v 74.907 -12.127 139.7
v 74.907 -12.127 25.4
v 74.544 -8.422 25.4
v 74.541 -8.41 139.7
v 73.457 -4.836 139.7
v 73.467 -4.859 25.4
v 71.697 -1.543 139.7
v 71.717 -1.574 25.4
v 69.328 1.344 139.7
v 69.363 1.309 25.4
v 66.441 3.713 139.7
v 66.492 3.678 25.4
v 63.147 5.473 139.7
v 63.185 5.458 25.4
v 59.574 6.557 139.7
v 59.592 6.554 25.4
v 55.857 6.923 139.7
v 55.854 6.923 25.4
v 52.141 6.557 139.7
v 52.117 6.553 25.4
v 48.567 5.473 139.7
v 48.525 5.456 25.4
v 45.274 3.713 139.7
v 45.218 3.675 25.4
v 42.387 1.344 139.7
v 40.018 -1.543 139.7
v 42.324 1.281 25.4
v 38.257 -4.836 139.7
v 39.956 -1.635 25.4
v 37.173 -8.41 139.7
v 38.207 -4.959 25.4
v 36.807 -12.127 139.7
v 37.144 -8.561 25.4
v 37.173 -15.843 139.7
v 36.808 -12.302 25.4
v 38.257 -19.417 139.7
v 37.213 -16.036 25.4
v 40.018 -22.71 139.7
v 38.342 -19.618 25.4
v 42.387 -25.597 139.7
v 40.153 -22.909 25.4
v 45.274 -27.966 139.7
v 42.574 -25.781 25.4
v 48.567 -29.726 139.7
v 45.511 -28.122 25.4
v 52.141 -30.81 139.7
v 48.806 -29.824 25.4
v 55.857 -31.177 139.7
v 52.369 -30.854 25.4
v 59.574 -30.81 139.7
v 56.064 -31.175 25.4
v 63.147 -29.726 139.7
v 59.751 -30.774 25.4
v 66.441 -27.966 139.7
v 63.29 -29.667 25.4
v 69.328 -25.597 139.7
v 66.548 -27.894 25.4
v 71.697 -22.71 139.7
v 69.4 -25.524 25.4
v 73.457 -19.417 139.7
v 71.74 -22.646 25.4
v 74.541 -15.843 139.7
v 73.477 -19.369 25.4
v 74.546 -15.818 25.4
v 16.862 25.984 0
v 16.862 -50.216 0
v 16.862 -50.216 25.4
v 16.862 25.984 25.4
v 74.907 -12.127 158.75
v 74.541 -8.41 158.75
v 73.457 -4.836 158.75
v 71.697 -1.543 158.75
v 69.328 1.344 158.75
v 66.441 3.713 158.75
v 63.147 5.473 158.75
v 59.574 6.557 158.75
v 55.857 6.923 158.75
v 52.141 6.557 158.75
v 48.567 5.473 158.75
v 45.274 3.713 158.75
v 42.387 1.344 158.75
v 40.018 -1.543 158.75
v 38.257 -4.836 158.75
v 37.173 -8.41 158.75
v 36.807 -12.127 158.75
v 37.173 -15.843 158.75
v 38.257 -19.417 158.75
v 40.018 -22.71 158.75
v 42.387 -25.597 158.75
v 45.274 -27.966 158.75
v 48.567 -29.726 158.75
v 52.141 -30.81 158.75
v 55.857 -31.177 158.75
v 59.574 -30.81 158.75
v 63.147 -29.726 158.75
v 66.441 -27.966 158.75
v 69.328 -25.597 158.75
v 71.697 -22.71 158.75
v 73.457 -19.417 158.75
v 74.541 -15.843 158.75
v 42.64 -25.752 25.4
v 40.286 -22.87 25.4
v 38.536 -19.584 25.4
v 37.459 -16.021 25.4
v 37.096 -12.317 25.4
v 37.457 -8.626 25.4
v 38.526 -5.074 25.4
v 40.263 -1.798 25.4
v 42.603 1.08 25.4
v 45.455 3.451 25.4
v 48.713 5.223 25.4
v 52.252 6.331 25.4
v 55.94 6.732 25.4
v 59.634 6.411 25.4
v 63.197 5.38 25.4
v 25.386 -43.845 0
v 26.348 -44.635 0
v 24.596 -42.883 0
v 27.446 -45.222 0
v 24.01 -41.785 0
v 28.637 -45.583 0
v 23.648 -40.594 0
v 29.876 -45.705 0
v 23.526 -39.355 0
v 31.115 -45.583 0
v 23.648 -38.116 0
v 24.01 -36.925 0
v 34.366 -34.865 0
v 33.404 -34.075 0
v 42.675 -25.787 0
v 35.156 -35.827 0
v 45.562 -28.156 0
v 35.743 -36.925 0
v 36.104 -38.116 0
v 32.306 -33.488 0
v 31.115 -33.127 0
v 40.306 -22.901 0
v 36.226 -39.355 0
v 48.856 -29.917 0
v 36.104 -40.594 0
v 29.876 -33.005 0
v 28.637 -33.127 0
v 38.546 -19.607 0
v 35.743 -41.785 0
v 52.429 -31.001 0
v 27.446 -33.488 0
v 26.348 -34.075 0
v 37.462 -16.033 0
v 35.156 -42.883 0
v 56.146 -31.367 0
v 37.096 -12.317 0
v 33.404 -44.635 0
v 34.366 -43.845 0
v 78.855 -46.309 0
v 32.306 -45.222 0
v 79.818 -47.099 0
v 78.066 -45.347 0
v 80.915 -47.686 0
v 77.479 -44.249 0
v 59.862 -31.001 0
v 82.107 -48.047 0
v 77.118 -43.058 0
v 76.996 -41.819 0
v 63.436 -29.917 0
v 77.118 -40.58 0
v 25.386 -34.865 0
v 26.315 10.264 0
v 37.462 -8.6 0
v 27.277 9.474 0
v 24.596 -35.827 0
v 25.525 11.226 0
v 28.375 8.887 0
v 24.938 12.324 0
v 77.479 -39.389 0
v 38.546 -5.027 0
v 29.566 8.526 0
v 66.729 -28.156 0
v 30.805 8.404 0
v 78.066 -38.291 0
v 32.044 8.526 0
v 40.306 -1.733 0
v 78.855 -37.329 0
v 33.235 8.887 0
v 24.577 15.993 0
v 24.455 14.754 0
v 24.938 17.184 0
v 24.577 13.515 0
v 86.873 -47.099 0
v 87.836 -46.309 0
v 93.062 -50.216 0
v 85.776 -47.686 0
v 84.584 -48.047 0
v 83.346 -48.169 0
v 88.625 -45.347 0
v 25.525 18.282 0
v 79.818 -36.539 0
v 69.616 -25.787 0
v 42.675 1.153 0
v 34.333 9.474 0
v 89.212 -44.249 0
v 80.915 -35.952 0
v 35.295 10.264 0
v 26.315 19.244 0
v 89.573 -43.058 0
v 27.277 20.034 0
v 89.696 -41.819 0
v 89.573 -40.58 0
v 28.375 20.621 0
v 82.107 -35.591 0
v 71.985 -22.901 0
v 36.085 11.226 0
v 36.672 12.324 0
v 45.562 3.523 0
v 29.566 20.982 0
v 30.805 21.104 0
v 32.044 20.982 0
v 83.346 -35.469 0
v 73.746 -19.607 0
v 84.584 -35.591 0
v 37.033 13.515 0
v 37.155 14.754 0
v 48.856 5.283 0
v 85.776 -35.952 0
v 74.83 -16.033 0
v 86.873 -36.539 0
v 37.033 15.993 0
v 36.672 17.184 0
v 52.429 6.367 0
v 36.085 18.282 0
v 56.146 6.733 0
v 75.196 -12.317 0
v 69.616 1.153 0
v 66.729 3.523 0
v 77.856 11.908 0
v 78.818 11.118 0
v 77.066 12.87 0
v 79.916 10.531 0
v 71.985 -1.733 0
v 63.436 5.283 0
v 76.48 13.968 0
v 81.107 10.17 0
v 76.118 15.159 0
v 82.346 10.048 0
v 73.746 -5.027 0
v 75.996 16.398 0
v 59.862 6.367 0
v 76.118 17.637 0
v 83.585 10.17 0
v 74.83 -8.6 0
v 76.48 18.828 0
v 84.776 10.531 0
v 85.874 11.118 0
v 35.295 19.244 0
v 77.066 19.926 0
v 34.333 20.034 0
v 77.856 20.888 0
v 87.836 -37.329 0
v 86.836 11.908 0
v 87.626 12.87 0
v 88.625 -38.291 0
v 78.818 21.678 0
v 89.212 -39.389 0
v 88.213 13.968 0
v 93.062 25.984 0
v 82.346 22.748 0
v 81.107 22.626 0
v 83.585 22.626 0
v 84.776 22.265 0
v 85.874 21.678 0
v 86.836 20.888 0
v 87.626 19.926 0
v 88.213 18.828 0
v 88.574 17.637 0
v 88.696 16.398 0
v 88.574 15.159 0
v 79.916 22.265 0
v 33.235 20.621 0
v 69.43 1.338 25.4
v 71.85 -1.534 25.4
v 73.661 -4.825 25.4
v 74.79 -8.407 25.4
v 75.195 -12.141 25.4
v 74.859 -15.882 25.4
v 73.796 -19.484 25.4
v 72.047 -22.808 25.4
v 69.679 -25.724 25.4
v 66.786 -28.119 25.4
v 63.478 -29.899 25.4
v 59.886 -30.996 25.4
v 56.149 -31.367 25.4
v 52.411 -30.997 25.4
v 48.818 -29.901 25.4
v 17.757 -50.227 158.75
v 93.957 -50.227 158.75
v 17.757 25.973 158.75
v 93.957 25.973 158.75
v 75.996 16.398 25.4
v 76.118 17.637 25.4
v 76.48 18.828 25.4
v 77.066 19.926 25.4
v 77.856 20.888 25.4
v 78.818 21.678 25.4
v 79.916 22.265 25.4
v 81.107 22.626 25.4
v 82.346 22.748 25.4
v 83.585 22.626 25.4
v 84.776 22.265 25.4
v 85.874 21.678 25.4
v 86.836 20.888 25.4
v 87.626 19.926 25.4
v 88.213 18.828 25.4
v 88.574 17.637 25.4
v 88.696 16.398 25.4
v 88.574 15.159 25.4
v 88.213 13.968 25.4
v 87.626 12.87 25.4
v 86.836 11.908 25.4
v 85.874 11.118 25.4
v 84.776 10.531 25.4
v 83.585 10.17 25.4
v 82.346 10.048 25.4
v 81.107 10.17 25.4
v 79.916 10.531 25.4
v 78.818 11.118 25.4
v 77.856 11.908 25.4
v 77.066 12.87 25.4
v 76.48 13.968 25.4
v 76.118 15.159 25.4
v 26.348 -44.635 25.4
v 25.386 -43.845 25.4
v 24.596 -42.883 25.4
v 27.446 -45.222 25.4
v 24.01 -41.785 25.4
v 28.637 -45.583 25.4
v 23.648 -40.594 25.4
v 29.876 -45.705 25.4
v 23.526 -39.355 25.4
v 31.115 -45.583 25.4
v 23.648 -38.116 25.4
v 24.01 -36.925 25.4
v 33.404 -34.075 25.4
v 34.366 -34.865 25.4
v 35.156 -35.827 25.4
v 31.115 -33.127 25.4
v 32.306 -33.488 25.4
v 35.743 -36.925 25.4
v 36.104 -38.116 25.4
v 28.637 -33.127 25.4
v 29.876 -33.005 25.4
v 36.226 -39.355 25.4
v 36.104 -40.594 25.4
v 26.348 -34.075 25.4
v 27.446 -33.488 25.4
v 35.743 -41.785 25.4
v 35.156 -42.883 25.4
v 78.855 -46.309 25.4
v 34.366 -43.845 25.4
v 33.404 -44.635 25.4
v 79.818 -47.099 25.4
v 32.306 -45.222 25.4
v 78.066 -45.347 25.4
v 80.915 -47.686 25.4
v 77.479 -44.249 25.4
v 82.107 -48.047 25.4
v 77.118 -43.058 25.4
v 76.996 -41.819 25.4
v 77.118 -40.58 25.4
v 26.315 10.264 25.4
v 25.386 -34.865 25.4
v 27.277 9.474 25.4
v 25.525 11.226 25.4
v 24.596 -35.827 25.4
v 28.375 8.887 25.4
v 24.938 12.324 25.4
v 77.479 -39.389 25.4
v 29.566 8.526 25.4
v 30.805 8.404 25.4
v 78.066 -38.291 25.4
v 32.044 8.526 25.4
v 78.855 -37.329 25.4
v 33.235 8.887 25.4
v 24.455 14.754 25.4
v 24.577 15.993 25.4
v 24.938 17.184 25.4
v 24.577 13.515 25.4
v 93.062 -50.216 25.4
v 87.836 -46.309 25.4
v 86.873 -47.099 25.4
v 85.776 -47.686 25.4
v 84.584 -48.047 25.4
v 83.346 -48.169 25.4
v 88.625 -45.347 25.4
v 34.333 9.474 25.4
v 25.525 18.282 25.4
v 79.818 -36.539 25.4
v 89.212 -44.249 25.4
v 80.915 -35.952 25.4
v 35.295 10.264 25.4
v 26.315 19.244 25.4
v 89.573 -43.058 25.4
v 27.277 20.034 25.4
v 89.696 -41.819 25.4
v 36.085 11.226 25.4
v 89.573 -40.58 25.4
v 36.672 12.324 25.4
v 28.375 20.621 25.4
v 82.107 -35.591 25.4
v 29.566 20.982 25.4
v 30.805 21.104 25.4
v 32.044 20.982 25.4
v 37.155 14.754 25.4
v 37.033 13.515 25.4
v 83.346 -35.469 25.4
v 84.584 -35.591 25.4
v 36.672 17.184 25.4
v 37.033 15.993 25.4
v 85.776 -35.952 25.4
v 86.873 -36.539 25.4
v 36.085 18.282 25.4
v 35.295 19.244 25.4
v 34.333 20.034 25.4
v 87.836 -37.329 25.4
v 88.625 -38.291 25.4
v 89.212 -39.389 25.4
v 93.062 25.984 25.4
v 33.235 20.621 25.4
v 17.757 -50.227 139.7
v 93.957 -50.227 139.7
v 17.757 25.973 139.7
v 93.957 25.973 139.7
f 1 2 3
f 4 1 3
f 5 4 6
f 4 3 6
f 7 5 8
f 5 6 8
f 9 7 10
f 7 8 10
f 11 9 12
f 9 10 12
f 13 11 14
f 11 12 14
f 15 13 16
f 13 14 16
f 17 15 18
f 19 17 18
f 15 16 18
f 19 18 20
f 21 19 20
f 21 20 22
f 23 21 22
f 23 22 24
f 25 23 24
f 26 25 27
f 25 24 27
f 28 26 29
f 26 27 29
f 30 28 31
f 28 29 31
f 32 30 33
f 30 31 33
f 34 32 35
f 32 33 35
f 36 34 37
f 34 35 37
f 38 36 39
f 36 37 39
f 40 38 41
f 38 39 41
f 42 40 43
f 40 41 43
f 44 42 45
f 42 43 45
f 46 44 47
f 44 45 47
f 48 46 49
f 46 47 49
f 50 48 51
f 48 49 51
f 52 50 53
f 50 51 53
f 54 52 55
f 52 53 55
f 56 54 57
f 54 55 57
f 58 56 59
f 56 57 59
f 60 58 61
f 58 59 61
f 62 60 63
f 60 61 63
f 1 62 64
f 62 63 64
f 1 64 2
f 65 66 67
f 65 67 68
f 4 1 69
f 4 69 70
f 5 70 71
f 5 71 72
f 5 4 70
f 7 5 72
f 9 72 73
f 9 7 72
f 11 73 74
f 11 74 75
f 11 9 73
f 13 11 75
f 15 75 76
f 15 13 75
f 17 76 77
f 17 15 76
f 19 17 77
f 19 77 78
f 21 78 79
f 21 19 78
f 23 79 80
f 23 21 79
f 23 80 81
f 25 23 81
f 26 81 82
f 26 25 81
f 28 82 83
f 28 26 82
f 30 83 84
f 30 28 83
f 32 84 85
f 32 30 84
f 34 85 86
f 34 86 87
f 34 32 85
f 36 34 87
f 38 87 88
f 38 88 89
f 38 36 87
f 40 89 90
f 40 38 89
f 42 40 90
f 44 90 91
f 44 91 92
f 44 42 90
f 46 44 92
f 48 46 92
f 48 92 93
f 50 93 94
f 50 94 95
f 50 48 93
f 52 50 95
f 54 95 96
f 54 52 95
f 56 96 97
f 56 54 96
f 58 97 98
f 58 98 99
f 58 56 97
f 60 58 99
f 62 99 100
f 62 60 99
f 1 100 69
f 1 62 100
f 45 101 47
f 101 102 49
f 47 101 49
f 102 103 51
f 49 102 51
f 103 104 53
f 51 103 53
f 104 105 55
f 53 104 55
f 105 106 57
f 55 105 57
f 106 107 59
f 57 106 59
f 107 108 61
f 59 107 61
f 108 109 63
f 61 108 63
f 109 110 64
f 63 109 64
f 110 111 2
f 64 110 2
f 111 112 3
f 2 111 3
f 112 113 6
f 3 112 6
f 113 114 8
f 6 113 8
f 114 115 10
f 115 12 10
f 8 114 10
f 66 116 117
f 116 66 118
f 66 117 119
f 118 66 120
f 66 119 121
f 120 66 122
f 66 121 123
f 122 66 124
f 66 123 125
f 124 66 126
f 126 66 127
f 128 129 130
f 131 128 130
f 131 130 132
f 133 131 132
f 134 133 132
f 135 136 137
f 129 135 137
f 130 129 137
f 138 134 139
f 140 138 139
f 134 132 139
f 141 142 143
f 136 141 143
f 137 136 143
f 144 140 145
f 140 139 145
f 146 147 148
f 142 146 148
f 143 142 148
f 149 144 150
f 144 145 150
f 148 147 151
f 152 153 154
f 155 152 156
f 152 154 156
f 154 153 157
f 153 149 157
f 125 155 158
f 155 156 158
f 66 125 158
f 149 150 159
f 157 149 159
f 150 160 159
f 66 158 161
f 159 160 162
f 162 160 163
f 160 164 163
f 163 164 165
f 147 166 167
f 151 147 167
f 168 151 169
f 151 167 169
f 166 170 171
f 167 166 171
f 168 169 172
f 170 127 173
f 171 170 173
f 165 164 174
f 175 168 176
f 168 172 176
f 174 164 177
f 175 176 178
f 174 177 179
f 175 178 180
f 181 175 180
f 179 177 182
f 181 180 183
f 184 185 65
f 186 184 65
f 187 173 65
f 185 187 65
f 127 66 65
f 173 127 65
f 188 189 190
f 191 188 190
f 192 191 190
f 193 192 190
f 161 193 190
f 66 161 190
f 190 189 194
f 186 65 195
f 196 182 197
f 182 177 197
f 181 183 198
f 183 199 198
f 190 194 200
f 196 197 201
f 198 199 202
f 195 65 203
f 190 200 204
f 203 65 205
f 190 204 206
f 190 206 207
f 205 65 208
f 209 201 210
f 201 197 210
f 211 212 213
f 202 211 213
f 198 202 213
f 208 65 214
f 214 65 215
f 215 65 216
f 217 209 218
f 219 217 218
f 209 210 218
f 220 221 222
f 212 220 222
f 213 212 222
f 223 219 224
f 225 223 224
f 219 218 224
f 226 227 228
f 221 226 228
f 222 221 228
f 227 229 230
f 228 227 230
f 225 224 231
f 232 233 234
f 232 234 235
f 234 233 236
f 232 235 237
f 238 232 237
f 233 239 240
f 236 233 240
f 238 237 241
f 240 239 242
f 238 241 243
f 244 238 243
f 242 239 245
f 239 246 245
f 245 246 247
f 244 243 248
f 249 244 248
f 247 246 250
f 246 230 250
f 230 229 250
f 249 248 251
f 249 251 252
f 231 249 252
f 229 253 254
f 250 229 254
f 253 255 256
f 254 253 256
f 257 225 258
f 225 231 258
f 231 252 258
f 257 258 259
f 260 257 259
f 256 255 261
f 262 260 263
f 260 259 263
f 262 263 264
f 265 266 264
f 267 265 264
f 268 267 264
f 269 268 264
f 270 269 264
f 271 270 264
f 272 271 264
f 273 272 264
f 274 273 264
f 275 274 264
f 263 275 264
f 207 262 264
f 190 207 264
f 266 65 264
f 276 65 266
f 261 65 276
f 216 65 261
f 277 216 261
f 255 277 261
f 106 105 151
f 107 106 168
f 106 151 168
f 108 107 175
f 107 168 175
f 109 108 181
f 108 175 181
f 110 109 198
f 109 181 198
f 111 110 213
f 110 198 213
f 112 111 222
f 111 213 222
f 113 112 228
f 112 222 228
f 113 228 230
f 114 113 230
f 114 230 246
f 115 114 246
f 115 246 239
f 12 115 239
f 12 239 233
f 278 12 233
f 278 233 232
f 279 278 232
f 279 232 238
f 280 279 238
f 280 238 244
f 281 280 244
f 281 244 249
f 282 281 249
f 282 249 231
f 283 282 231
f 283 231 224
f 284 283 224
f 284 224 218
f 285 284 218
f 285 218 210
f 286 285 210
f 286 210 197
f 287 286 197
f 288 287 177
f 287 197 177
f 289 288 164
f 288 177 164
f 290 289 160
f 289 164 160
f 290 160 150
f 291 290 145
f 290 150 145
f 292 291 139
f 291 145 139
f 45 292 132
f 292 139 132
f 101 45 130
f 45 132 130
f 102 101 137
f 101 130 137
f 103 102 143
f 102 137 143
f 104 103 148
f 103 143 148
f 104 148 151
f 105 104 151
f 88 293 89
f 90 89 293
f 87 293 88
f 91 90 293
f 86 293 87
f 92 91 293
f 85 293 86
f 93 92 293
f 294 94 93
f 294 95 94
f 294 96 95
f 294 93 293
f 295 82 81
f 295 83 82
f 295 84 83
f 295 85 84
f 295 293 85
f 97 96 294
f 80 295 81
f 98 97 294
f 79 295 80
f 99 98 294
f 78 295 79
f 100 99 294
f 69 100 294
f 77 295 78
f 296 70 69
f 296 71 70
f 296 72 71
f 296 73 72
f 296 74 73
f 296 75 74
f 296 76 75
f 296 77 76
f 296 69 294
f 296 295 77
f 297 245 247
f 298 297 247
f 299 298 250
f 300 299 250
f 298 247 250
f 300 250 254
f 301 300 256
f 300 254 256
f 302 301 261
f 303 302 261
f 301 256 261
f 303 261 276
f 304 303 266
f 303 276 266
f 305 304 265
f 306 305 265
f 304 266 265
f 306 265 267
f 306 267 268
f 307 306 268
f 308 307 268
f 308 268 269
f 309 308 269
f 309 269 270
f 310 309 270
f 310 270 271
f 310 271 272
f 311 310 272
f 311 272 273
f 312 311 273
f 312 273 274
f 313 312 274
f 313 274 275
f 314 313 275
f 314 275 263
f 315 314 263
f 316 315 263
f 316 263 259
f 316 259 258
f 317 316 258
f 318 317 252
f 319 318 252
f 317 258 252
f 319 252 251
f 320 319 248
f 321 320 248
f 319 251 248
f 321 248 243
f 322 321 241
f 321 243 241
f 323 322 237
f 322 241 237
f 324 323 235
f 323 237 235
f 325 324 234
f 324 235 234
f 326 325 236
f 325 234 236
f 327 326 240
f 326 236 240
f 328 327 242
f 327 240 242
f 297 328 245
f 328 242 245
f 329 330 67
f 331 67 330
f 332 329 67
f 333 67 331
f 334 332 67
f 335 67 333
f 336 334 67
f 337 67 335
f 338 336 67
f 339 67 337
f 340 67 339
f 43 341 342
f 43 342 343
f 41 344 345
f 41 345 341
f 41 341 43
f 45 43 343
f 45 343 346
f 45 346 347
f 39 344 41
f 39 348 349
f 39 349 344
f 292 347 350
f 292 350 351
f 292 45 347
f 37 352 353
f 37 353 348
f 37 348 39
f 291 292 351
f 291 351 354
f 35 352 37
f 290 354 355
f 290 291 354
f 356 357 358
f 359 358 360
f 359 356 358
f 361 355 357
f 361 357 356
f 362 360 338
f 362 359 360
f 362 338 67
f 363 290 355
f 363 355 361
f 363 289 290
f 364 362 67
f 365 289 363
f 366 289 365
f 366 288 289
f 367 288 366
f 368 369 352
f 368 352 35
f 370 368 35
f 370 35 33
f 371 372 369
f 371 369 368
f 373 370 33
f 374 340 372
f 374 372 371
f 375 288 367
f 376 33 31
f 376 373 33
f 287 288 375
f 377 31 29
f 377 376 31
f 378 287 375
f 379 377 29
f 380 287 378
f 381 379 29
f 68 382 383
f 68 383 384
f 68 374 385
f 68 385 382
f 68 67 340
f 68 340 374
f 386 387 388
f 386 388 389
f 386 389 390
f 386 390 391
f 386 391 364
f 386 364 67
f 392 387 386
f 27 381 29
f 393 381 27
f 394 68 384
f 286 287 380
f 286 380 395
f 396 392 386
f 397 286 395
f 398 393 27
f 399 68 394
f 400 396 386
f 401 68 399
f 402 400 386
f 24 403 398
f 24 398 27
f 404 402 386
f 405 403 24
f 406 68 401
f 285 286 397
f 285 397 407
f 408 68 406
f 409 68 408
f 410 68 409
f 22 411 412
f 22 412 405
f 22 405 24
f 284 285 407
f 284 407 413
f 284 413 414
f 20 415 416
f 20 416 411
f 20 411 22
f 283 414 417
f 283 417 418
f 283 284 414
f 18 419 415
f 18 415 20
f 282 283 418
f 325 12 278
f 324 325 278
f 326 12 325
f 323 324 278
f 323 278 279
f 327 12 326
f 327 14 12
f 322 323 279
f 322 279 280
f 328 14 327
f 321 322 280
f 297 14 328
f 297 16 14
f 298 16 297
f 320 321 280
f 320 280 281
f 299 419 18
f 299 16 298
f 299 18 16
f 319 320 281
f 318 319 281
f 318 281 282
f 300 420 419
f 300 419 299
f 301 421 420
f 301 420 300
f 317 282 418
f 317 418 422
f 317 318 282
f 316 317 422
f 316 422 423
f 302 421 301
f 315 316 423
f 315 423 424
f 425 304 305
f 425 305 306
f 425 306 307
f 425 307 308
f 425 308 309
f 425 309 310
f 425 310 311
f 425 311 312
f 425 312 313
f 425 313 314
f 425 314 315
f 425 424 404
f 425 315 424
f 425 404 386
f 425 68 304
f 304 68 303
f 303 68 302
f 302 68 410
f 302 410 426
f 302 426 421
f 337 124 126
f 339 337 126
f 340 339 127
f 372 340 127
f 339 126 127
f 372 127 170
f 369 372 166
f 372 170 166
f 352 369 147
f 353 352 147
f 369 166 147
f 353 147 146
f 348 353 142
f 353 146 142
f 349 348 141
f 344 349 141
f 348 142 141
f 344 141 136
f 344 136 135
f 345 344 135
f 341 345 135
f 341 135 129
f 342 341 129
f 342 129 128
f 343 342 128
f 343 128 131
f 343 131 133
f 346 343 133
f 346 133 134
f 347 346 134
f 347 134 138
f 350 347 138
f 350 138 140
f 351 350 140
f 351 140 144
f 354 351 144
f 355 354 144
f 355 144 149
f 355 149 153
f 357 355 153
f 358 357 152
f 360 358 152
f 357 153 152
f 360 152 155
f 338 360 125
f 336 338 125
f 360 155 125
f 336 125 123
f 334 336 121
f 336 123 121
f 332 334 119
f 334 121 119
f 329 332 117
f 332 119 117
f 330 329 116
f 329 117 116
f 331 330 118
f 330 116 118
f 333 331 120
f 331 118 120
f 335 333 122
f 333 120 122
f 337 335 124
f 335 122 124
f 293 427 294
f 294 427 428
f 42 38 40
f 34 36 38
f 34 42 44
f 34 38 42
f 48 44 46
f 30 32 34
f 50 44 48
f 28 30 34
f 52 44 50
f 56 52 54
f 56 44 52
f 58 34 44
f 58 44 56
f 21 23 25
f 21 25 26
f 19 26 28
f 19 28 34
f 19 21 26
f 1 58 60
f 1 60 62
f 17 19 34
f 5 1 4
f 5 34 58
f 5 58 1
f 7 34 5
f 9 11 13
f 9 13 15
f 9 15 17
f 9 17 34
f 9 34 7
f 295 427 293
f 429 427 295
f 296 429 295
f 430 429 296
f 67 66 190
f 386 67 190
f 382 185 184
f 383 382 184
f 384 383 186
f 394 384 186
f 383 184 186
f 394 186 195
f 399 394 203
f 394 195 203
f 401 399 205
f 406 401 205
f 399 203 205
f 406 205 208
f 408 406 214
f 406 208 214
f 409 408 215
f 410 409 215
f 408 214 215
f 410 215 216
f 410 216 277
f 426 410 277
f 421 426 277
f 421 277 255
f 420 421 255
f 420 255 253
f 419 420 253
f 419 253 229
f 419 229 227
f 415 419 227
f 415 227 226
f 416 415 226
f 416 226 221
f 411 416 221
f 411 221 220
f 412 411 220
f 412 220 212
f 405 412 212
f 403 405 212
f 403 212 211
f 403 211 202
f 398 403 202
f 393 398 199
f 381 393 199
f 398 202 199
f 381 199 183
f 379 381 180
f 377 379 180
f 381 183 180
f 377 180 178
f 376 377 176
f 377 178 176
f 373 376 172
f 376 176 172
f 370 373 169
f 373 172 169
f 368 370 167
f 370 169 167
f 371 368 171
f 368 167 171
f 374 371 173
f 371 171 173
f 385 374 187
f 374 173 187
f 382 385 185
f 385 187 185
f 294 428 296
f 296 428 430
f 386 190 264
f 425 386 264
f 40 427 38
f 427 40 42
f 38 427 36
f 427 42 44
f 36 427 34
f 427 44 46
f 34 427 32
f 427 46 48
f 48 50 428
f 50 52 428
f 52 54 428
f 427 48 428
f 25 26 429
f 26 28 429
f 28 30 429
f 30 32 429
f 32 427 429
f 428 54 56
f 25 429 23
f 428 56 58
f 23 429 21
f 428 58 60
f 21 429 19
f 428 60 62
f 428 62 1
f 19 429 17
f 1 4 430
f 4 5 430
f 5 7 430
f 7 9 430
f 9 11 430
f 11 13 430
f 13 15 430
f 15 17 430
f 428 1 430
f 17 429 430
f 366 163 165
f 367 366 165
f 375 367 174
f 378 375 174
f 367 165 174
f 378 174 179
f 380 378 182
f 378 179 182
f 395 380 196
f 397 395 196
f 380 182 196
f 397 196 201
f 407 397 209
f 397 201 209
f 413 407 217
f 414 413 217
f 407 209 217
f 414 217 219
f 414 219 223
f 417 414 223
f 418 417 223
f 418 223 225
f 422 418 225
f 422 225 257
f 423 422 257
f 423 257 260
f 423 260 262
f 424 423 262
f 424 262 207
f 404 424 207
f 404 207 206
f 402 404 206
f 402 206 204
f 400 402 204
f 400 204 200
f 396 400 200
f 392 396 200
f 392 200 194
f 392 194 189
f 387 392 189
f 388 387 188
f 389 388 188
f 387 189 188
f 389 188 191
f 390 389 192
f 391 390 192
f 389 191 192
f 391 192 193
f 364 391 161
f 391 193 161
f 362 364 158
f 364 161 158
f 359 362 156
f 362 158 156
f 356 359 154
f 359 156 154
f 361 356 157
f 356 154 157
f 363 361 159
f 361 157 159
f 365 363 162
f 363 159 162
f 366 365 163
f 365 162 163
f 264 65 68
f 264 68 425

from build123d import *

# Parameters (mm, degrees)
F0_W      = 76.2
F0_H      = 76.2
F1_DEPTH  = 25.4
F4_D      = 38.1
F9_D      = 12.7
F10_R     = 19.05
F11_DEPTH = 114.3
F12_W     = 76.2
F12_H     = 76.2
F12_R     = 19.05
F13_DEPTH = 25.4
F15_W     = 76.2
F15_H     = 76.2
F15_R     = 19.05
F16_DEPTH = 19.05


with BuildPart() as f1:
    # F0 (on Top) → F1 (new body)
    with BuildSketch(Plane.XY):
        with Locations((54.962432, -12.116313)):
            Rectangle(F0_W, F0_H)
    extrude(amount=F1_DEPTH)

    # F4 (through all)
    with Locations(Plane.XY.offset(25.4)):
        with Locations((56.145839, -12.316914)):
            Hole(F4_D / 2)

    # F9 (through all)
    with Locations(Plane.XY.offset(25.4)):
        with Locations((83.34551, -41.819107), (29.876301, -39.355114), (30.805135, 14.753973), (82.346298, 16.398087)):
            Hole(F9_D / 2)

    # F10 (on face) → F11 (join)
    with BuildSketch(Plane.XY.offset(25.4)):
        with Locations((55.857293, -12.126533)):
            Circle(F10_R)
    extrude(amount=F11_DEPTH)


with BuildPart() as f13:
    # F12 (on face) → F13 (new body)
    with BuildSketch(Plane.XY.offset(139.7)):
        with Locations((55.857293, -12.126533)):
            Rectangle(F12_W, F12_H)
        with Locations((55.857293, -12.126533)):
            Circle(F12_R, mode=Mode.SUBTRACT)
    extrude(amount=F13_DEPTH)


with BuildPart() as f16:
    # F15 (on face) → F16 (new body)
    with BuildSketch(Plane.XY.offset(139.7)):
        with Locations((55.857293, -12.126533)):
            Rectangle(F15_W, F15_H)
        with Locations((55.857293, -12.126533)):
            Circle(F15_R, mode=Mode.SUBTRACT)
    extrude(amount=F16_DEPTH)


solid = Compound([f1.part, f16.part])
